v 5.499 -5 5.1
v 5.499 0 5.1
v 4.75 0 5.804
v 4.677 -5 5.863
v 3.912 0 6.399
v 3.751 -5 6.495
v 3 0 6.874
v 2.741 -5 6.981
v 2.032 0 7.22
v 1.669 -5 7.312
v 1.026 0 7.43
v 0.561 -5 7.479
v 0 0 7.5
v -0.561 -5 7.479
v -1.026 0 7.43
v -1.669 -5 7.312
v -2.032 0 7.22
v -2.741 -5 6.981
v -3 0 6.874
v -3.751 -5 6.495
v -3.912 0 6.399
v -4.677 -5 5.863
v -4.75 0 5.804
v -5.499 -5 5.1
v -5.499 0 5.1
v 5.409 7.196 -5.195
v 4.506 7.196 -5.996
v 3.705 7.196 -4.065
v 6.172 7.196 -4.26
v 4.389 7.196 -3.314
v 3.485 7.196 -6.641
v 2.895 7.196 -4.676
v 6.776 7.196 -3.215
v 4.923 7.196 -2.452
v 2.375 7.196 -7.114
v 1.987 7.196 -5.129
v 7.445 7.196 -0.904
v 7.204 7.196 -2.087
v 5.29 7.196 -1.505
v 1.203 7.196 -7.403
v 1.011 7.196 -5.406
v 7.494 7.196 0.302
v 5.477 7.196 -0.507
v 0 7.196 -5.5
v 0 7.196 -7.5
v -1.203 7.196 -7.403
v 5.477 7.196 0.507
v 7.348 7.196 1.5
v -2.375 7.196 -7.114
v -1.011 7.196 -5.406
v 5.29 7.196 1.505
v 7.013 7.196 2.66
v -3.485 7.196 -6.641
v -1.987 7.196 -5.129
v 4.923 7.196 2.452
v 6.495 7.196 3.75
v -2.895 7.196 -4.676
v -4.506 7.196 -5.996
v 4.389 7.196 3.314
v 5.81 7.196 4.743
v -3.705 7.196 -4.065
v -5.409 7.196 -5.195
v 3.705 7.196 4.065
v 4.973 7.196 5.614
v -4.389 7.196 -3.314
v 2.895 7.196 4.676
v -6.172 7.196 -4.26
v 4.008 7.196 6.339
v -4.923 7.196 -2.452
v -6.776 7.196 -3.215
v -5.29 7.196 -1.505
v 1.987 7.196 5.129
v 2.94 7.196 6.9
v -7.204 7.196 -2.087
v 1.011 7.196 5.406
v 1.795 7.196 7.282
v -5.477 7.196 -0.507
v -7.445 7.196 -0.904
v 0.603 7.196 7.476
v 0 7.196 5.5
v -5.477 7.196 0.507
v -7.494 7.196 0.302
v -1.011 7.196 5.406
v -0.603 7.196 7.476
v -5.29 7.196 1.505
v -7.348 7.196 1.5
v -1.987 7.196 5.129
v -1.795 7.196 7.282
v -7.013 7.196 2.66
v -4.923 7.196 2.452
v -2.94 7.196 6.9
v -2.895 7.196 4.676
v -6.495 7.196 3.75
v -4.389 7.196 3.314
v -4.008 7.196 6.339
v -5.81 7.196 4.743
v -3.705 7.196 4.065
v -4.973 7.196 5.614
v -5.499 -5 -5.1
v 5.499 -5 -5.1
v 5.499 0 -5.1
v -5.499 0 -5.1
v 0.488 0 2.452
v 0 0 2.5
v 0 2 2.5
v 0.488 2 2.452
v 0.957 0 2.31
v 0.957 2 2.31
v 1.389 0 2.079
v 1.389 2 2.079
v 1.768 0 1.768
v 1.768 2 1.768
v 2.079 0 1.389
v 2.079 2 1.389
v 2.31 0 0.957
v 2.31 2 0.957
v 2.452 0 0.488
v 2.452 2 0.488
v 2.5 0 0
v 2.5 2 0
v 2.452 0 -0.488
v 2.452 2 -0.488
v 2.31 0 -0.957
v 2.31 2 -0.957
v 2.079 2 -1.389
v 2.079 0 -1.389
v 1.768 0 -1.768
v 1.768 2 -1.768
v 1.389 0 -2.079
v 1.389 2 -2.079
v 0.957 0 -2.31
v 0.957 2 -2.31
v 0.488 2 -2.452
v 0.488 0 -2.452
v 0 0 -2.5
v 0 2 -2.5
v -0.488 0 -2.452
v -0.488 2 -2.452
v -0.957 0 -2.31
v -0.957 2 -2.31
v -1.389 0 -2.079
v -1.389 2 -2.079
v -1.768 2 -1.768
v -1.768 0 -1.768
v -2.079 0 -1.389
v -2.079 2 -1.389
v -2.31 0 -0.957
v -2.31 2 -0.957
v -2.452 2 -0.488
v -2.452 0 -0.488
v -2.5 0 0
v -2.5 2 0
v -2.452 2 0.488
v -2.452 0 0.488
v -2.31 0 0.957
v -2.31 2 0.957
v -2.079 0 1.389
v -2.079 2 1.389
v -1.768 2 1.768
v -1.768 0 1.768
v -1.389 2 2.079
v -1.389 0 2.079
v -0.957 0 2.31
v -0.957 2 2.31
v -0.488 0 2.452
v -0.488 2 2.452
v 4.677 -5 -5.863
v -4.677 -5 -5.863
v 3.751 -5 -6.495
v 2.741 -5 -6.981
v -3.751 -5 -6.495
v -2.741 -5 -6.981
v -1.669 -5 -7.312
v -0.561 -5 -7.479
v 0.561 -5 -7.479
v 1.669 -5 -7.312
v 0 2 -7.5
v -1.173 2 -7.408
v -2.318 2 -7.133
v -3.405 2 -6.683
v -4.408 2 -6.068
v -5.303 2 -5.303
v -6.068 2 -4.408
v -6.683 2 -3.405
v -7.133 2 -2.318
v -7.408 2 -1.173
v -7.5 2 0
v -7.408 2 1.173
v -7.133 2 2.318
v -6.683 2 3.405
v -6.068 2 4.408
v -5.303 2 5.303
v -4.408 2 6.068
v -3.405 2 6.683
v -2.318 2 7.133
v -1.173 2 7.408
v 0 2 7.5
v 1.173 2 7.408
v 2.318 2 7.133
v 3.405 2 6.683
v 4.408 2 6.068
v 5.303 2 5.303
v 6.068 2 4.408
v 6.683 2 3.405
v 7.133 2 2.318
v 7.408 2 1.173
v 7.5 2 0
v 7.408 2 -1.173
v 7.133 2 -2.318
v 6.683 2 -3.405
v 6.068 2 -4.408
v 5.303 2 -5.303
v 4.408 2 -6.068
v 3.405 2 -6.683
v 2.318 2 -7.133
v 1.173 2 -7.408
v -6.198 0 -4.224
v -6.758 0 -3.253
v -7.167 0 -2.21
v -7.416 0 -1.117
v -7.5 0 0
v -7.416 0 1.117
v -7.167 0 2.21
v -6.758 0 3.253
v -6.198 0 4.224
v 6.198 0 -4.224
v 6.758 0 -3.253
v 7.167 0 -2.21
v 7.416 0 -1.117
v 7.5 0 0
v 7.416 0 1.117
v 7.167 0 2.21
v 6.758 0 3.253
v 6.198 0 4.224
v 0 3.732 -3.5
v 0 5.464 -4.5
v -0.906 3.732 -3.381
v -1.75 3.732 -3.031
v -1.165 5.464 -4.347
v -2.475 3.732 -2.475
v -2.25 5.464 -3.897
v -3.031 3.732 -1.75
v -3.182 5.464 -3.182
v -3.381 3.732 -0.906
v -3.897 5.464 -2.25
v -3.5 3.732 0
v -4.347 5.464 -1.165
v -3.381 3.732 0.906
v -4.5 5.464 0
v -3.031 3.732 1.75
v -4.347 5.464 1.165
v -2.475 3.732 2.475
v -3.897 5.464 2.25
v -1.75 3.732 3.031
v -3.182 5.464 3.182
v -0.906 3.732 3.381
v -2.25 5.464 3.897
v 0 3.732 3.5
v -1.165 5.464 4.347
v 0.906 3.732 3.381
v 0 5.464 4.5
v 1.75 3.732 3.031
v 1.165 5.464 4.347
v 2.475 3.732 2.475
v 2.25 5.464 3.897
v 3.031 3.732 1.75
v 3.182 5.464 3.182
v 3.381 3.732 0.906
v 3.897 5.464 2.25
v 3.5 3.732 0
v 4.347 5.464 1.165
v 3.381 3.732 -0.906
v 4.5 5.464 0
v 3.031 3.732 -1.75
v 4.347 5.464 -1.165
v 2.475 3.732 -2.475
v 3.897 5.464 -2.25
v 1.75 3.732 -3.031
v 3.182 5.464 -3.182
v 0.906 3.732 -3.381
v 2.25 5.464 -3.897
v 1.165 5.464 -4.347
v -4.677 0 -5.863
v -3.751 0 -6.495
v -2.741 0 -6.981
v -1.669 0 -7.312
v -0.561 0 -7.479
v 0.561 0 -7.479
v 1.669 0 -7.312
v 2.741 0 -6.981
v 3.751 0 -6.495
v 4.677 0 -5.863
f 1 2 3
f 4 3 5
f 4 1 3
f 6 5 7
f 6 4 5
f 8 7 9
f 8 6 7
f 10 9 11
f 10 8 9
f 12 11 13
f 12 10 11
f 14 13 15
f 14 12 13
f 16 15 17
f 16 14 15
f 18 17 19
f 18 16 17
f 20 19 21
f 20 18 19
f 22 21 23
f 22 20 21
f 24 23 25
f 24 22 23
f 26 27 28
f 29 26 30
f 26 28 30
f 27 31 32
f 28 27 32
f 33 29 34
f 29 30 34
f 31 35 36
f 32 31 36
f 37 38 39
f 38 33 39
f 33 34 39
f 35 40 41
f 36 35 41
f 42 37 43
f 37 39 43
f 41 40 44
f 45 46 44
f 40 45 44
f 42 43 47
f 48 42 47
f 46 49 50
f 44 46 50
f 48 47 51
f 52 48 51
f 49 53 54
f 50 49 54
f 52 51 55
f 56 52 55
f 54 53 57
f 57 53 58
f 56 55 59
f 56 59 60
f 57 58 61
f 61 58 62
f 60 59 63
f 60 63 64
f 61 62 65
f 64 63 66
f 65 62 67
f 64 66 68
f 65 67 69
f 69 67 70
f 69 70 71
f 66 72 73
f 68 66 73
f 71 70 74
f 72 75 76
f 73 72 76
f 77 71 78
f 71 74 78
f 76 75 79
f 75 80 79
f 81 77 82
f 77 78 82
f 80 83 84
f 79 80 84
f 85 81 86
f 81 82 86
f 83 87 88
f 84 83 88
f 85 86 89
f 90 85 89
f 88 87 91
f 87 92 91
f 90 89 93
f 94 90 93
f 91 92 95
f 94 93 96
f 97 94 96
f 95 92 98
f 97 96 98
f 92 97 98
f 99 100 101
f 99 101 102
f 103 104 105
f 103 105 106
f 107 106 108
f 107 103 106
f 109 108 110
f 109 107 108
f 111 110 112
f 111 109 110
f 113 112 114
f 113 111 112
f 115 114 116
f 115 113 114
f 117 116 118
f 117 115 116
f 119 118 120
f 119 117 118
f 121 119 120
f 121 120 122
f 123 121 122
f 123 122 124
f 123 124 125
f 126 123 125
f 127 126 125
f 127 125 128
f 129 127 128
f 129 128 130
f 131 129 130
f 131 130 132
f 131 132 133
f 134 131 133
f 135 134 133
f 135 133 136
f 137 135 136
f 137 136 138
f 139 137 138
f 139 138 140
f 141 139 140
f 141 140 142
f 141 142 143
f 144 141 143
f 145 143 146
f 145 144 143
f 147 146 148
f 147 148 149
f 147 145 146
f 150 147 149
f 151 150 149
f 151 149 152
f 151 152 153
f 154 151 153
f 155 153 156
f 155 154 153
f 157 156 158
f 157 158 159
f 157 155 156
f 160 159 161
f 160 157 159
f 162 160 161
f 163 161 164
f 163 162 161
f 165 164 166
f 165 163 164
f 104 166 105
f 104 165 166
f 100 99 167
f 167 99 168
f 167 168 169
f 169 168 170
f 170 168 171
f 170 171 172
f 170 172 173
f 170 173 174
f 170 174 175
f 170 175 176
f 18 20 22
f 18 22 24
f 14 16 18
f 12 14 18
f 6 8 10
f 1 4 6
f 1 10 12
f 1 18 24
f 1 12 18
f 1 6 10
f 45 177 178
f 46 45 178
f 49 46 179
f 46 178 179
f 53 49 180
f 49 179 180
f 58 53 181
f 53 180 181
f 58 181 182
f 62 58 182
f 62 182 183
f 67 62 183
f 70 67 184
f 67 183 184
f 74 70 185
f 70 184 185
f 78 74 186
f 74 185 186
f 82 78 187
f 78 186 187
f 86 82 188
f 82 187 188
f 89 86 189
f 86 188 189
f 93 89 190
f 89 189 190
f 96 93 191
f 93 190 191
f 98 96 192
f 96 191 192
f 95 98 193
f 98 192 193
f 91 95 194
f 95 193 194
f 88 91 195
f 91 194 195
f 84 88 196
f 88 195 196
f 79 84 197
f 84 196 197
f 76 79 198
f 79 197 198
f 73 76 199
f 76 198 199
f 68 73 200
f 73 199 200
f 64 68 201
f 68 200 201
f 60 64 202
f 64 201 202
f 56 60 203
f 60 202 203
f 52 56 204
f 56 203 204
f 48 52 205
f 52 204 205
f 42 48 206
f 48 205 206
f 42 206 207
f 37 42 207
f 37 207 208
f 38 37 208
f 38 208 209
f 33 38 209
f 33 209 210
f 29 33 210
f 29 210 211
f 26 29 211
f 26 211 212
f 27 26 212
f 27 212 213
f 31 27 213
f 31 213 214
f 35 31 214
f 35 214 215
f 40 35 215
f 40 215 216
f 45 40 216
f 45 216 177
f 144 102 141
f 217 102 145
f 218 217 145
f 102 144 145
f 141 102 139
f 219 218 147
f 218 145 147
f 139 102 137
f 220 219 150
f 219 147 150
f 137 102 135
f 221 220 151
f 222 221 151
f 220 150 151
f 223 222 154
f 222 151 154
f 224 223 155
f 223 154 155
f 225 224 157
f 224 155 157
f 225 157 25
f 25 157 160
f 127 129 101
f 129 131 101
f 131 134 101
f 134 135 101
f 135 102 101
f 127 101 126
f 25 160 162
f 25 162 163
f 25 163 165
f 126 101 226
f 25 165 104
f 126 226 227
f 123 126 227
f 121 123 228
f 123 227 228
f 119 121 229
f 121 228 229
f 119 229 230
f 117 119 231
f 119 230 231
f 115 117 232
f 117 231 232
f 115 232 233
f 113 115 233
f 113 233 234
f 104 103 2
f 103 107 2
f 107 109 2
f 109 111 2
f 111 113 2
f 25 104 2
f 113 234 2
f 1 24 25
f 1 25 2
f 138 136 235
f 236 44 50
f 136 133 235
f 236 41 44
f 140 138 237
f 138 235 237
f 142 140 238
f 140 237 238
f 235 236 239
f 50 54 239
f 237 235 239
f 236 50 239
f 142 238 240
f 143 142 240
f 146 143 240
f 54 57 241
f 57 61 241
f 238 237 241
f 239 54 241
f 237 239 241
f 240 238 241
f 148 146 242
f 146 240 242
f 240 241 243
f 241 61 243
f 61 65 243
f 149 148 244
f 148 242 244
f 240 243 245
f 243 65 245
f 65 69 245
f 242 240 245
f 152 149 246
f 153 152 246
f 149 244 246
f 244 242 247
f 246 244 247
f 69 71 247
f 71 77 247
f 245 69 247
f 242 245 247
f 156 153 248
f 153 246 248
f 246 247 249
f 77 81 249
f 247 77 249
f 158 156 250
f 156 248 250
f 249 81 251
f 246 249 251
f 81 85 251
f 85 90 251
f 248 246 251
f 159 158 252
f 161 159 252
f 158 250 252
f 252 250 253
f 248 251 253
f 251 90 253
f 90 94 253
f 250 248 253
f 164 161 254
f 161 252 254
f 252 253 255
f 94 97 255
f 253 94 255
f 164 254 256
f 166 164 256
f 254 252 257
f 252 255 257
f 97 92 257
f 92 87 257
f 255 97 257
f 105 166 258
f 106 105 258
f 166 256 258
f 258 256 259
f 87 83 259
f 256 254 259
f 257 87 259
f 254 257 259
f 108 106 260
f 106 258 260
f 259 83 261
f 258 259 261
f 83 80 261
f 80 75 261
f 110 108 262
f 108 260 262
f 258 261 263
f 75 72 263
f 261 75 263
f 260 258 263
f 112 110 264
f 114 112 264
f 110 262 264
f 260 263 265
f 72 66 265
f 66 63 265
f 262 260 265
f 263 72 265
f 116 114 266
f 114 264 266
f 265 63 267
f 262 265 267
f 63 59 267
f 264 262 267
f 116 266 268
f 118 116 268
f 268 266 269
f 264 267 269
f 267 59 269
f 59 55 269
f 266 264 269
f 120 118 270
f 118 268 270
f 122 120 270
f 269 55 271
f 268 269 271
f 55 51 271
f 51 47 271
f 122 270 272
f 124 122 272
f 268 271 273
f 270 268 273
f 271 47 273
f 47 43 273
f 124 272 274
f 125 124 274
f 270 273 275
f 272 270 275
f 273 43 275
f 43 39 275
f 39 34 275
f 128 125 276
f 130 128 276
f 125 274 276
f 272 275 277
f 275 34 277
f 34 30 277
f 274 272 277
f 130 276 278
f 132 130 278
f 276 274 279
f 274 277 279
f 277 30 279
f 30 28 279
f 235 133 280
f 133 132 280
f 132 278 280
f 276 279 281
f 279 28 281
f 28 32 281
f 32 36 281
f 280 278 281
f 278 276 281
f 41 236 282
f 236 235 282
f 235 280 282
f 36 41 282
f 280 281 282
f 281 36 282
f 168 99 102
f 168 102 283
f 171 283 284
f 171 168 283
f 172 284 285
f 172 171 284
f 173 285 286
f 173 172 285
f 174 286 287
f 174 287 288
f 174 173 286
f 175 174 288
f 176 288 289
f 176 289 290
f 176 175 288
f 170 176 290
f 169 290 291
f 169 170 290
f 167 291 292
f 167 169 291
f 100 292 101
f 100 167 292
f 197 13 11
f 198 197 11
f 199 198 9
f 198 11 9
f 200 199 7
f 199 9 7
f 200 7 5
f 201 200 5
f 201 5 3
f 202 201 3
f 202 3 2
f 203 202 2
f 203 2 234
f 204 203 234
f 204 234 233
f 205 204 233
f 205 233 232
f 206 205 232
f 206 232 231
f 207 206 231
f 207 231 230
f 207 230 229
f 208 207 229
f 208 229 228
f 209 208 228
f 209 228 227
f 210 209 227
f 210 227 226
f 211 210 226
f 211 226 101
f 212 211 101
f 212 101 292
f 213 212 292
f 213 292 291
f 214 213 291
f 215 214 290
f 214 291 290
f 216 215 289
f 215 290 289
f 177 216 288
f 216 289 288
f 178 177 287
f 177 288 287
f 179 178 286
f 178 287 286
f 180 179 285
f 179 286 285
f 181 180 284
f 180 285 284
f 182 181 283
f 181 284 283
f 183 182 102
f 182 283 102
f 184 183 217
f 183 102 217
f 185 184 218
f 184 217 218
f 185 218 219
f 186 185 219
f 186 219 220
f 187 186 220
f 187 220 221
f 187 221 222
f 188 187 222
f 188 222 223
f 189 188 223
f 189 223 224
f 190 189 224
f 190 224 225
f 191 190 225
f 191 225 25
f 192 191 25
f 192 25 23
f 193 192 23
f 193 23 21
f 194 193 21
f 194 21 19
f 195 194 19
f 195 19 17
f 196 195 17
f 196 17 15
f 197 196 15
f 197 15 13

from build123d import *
from build123d.topology import SkipClean

# Parameters (mm, degrees)
SKETCH7_R           = 7.5
SKETCH7_R_2         = 2.5
BOSS_EXTRUDE3_DEPTH = 2
BOSS_EXTRUDE4_START = 5
BOSS_EXTRUDE4_DEPTH = 5


with BuildPart() as part:
    # Sketch7 → Boss-Extrude3 (new body)
    with BuildSketch(Plane(origin=(0, 0, 0), x_dir=(1, 0, 0), z_dir=(0, 1, 0))):
        with Locations(Location((0, 0, 0), (0, 0, 270))):
            Circle(SKETCH7_R)
        with Locations(Location((0, 0, 0), (0, 0, 270))):
            Circle(SKETCH7_R_2, mode=Mode.SUBTRACT)
    extrude(amount=BOSS_EXTRUDE3_DEPTH)

    # Sketch8 → Boss-Extrude4 (add)
    with SkipClean():  # the faces are left unmerged after this step: merging them gives an invalid solid
        with BuildSketch(Plane.XZ.offset(BOSS_EXTRUDE4_START)):
            with BuildLine():
                ThreePointArc((5.499090834, 5.1), (0, 7.5), (-5.499090834, 5.1))
                Line((-5.499090834, 5.1), (5.499090834, 5.1))
            make_face()
            with BuildLine():
                Line((5.499090834, -5.1), (-5.499090834, -5.1))
                ThreePointArc((-5.499090834, -5.1), (0, -7.5), (5.499090834, -5.1))
            make_face()
        extrude(amount=-BOSS_EXTRUDE4_DEPTH)

    # Sketch9 → Revolve1 (revolve)
    with SkipClean():  # the faces are left unmerged after this step: merging them gives an invalid solid
        with BuildSketch(Plane.XY, mode=Mode.PRIVATE) as revolve1_sk:
            Polygon((2.5, 2), (5.5, 7.196152423), (7.5, 7.196152423), (7.5, 2), align=None)
        revolve(revolve1_sk.sketch.rotate(Axis((0, 0, 0), (0, 1, 0)), 90), axis=Axis((0, 0, 0), (0, 1, 0)))


solid = part.part
